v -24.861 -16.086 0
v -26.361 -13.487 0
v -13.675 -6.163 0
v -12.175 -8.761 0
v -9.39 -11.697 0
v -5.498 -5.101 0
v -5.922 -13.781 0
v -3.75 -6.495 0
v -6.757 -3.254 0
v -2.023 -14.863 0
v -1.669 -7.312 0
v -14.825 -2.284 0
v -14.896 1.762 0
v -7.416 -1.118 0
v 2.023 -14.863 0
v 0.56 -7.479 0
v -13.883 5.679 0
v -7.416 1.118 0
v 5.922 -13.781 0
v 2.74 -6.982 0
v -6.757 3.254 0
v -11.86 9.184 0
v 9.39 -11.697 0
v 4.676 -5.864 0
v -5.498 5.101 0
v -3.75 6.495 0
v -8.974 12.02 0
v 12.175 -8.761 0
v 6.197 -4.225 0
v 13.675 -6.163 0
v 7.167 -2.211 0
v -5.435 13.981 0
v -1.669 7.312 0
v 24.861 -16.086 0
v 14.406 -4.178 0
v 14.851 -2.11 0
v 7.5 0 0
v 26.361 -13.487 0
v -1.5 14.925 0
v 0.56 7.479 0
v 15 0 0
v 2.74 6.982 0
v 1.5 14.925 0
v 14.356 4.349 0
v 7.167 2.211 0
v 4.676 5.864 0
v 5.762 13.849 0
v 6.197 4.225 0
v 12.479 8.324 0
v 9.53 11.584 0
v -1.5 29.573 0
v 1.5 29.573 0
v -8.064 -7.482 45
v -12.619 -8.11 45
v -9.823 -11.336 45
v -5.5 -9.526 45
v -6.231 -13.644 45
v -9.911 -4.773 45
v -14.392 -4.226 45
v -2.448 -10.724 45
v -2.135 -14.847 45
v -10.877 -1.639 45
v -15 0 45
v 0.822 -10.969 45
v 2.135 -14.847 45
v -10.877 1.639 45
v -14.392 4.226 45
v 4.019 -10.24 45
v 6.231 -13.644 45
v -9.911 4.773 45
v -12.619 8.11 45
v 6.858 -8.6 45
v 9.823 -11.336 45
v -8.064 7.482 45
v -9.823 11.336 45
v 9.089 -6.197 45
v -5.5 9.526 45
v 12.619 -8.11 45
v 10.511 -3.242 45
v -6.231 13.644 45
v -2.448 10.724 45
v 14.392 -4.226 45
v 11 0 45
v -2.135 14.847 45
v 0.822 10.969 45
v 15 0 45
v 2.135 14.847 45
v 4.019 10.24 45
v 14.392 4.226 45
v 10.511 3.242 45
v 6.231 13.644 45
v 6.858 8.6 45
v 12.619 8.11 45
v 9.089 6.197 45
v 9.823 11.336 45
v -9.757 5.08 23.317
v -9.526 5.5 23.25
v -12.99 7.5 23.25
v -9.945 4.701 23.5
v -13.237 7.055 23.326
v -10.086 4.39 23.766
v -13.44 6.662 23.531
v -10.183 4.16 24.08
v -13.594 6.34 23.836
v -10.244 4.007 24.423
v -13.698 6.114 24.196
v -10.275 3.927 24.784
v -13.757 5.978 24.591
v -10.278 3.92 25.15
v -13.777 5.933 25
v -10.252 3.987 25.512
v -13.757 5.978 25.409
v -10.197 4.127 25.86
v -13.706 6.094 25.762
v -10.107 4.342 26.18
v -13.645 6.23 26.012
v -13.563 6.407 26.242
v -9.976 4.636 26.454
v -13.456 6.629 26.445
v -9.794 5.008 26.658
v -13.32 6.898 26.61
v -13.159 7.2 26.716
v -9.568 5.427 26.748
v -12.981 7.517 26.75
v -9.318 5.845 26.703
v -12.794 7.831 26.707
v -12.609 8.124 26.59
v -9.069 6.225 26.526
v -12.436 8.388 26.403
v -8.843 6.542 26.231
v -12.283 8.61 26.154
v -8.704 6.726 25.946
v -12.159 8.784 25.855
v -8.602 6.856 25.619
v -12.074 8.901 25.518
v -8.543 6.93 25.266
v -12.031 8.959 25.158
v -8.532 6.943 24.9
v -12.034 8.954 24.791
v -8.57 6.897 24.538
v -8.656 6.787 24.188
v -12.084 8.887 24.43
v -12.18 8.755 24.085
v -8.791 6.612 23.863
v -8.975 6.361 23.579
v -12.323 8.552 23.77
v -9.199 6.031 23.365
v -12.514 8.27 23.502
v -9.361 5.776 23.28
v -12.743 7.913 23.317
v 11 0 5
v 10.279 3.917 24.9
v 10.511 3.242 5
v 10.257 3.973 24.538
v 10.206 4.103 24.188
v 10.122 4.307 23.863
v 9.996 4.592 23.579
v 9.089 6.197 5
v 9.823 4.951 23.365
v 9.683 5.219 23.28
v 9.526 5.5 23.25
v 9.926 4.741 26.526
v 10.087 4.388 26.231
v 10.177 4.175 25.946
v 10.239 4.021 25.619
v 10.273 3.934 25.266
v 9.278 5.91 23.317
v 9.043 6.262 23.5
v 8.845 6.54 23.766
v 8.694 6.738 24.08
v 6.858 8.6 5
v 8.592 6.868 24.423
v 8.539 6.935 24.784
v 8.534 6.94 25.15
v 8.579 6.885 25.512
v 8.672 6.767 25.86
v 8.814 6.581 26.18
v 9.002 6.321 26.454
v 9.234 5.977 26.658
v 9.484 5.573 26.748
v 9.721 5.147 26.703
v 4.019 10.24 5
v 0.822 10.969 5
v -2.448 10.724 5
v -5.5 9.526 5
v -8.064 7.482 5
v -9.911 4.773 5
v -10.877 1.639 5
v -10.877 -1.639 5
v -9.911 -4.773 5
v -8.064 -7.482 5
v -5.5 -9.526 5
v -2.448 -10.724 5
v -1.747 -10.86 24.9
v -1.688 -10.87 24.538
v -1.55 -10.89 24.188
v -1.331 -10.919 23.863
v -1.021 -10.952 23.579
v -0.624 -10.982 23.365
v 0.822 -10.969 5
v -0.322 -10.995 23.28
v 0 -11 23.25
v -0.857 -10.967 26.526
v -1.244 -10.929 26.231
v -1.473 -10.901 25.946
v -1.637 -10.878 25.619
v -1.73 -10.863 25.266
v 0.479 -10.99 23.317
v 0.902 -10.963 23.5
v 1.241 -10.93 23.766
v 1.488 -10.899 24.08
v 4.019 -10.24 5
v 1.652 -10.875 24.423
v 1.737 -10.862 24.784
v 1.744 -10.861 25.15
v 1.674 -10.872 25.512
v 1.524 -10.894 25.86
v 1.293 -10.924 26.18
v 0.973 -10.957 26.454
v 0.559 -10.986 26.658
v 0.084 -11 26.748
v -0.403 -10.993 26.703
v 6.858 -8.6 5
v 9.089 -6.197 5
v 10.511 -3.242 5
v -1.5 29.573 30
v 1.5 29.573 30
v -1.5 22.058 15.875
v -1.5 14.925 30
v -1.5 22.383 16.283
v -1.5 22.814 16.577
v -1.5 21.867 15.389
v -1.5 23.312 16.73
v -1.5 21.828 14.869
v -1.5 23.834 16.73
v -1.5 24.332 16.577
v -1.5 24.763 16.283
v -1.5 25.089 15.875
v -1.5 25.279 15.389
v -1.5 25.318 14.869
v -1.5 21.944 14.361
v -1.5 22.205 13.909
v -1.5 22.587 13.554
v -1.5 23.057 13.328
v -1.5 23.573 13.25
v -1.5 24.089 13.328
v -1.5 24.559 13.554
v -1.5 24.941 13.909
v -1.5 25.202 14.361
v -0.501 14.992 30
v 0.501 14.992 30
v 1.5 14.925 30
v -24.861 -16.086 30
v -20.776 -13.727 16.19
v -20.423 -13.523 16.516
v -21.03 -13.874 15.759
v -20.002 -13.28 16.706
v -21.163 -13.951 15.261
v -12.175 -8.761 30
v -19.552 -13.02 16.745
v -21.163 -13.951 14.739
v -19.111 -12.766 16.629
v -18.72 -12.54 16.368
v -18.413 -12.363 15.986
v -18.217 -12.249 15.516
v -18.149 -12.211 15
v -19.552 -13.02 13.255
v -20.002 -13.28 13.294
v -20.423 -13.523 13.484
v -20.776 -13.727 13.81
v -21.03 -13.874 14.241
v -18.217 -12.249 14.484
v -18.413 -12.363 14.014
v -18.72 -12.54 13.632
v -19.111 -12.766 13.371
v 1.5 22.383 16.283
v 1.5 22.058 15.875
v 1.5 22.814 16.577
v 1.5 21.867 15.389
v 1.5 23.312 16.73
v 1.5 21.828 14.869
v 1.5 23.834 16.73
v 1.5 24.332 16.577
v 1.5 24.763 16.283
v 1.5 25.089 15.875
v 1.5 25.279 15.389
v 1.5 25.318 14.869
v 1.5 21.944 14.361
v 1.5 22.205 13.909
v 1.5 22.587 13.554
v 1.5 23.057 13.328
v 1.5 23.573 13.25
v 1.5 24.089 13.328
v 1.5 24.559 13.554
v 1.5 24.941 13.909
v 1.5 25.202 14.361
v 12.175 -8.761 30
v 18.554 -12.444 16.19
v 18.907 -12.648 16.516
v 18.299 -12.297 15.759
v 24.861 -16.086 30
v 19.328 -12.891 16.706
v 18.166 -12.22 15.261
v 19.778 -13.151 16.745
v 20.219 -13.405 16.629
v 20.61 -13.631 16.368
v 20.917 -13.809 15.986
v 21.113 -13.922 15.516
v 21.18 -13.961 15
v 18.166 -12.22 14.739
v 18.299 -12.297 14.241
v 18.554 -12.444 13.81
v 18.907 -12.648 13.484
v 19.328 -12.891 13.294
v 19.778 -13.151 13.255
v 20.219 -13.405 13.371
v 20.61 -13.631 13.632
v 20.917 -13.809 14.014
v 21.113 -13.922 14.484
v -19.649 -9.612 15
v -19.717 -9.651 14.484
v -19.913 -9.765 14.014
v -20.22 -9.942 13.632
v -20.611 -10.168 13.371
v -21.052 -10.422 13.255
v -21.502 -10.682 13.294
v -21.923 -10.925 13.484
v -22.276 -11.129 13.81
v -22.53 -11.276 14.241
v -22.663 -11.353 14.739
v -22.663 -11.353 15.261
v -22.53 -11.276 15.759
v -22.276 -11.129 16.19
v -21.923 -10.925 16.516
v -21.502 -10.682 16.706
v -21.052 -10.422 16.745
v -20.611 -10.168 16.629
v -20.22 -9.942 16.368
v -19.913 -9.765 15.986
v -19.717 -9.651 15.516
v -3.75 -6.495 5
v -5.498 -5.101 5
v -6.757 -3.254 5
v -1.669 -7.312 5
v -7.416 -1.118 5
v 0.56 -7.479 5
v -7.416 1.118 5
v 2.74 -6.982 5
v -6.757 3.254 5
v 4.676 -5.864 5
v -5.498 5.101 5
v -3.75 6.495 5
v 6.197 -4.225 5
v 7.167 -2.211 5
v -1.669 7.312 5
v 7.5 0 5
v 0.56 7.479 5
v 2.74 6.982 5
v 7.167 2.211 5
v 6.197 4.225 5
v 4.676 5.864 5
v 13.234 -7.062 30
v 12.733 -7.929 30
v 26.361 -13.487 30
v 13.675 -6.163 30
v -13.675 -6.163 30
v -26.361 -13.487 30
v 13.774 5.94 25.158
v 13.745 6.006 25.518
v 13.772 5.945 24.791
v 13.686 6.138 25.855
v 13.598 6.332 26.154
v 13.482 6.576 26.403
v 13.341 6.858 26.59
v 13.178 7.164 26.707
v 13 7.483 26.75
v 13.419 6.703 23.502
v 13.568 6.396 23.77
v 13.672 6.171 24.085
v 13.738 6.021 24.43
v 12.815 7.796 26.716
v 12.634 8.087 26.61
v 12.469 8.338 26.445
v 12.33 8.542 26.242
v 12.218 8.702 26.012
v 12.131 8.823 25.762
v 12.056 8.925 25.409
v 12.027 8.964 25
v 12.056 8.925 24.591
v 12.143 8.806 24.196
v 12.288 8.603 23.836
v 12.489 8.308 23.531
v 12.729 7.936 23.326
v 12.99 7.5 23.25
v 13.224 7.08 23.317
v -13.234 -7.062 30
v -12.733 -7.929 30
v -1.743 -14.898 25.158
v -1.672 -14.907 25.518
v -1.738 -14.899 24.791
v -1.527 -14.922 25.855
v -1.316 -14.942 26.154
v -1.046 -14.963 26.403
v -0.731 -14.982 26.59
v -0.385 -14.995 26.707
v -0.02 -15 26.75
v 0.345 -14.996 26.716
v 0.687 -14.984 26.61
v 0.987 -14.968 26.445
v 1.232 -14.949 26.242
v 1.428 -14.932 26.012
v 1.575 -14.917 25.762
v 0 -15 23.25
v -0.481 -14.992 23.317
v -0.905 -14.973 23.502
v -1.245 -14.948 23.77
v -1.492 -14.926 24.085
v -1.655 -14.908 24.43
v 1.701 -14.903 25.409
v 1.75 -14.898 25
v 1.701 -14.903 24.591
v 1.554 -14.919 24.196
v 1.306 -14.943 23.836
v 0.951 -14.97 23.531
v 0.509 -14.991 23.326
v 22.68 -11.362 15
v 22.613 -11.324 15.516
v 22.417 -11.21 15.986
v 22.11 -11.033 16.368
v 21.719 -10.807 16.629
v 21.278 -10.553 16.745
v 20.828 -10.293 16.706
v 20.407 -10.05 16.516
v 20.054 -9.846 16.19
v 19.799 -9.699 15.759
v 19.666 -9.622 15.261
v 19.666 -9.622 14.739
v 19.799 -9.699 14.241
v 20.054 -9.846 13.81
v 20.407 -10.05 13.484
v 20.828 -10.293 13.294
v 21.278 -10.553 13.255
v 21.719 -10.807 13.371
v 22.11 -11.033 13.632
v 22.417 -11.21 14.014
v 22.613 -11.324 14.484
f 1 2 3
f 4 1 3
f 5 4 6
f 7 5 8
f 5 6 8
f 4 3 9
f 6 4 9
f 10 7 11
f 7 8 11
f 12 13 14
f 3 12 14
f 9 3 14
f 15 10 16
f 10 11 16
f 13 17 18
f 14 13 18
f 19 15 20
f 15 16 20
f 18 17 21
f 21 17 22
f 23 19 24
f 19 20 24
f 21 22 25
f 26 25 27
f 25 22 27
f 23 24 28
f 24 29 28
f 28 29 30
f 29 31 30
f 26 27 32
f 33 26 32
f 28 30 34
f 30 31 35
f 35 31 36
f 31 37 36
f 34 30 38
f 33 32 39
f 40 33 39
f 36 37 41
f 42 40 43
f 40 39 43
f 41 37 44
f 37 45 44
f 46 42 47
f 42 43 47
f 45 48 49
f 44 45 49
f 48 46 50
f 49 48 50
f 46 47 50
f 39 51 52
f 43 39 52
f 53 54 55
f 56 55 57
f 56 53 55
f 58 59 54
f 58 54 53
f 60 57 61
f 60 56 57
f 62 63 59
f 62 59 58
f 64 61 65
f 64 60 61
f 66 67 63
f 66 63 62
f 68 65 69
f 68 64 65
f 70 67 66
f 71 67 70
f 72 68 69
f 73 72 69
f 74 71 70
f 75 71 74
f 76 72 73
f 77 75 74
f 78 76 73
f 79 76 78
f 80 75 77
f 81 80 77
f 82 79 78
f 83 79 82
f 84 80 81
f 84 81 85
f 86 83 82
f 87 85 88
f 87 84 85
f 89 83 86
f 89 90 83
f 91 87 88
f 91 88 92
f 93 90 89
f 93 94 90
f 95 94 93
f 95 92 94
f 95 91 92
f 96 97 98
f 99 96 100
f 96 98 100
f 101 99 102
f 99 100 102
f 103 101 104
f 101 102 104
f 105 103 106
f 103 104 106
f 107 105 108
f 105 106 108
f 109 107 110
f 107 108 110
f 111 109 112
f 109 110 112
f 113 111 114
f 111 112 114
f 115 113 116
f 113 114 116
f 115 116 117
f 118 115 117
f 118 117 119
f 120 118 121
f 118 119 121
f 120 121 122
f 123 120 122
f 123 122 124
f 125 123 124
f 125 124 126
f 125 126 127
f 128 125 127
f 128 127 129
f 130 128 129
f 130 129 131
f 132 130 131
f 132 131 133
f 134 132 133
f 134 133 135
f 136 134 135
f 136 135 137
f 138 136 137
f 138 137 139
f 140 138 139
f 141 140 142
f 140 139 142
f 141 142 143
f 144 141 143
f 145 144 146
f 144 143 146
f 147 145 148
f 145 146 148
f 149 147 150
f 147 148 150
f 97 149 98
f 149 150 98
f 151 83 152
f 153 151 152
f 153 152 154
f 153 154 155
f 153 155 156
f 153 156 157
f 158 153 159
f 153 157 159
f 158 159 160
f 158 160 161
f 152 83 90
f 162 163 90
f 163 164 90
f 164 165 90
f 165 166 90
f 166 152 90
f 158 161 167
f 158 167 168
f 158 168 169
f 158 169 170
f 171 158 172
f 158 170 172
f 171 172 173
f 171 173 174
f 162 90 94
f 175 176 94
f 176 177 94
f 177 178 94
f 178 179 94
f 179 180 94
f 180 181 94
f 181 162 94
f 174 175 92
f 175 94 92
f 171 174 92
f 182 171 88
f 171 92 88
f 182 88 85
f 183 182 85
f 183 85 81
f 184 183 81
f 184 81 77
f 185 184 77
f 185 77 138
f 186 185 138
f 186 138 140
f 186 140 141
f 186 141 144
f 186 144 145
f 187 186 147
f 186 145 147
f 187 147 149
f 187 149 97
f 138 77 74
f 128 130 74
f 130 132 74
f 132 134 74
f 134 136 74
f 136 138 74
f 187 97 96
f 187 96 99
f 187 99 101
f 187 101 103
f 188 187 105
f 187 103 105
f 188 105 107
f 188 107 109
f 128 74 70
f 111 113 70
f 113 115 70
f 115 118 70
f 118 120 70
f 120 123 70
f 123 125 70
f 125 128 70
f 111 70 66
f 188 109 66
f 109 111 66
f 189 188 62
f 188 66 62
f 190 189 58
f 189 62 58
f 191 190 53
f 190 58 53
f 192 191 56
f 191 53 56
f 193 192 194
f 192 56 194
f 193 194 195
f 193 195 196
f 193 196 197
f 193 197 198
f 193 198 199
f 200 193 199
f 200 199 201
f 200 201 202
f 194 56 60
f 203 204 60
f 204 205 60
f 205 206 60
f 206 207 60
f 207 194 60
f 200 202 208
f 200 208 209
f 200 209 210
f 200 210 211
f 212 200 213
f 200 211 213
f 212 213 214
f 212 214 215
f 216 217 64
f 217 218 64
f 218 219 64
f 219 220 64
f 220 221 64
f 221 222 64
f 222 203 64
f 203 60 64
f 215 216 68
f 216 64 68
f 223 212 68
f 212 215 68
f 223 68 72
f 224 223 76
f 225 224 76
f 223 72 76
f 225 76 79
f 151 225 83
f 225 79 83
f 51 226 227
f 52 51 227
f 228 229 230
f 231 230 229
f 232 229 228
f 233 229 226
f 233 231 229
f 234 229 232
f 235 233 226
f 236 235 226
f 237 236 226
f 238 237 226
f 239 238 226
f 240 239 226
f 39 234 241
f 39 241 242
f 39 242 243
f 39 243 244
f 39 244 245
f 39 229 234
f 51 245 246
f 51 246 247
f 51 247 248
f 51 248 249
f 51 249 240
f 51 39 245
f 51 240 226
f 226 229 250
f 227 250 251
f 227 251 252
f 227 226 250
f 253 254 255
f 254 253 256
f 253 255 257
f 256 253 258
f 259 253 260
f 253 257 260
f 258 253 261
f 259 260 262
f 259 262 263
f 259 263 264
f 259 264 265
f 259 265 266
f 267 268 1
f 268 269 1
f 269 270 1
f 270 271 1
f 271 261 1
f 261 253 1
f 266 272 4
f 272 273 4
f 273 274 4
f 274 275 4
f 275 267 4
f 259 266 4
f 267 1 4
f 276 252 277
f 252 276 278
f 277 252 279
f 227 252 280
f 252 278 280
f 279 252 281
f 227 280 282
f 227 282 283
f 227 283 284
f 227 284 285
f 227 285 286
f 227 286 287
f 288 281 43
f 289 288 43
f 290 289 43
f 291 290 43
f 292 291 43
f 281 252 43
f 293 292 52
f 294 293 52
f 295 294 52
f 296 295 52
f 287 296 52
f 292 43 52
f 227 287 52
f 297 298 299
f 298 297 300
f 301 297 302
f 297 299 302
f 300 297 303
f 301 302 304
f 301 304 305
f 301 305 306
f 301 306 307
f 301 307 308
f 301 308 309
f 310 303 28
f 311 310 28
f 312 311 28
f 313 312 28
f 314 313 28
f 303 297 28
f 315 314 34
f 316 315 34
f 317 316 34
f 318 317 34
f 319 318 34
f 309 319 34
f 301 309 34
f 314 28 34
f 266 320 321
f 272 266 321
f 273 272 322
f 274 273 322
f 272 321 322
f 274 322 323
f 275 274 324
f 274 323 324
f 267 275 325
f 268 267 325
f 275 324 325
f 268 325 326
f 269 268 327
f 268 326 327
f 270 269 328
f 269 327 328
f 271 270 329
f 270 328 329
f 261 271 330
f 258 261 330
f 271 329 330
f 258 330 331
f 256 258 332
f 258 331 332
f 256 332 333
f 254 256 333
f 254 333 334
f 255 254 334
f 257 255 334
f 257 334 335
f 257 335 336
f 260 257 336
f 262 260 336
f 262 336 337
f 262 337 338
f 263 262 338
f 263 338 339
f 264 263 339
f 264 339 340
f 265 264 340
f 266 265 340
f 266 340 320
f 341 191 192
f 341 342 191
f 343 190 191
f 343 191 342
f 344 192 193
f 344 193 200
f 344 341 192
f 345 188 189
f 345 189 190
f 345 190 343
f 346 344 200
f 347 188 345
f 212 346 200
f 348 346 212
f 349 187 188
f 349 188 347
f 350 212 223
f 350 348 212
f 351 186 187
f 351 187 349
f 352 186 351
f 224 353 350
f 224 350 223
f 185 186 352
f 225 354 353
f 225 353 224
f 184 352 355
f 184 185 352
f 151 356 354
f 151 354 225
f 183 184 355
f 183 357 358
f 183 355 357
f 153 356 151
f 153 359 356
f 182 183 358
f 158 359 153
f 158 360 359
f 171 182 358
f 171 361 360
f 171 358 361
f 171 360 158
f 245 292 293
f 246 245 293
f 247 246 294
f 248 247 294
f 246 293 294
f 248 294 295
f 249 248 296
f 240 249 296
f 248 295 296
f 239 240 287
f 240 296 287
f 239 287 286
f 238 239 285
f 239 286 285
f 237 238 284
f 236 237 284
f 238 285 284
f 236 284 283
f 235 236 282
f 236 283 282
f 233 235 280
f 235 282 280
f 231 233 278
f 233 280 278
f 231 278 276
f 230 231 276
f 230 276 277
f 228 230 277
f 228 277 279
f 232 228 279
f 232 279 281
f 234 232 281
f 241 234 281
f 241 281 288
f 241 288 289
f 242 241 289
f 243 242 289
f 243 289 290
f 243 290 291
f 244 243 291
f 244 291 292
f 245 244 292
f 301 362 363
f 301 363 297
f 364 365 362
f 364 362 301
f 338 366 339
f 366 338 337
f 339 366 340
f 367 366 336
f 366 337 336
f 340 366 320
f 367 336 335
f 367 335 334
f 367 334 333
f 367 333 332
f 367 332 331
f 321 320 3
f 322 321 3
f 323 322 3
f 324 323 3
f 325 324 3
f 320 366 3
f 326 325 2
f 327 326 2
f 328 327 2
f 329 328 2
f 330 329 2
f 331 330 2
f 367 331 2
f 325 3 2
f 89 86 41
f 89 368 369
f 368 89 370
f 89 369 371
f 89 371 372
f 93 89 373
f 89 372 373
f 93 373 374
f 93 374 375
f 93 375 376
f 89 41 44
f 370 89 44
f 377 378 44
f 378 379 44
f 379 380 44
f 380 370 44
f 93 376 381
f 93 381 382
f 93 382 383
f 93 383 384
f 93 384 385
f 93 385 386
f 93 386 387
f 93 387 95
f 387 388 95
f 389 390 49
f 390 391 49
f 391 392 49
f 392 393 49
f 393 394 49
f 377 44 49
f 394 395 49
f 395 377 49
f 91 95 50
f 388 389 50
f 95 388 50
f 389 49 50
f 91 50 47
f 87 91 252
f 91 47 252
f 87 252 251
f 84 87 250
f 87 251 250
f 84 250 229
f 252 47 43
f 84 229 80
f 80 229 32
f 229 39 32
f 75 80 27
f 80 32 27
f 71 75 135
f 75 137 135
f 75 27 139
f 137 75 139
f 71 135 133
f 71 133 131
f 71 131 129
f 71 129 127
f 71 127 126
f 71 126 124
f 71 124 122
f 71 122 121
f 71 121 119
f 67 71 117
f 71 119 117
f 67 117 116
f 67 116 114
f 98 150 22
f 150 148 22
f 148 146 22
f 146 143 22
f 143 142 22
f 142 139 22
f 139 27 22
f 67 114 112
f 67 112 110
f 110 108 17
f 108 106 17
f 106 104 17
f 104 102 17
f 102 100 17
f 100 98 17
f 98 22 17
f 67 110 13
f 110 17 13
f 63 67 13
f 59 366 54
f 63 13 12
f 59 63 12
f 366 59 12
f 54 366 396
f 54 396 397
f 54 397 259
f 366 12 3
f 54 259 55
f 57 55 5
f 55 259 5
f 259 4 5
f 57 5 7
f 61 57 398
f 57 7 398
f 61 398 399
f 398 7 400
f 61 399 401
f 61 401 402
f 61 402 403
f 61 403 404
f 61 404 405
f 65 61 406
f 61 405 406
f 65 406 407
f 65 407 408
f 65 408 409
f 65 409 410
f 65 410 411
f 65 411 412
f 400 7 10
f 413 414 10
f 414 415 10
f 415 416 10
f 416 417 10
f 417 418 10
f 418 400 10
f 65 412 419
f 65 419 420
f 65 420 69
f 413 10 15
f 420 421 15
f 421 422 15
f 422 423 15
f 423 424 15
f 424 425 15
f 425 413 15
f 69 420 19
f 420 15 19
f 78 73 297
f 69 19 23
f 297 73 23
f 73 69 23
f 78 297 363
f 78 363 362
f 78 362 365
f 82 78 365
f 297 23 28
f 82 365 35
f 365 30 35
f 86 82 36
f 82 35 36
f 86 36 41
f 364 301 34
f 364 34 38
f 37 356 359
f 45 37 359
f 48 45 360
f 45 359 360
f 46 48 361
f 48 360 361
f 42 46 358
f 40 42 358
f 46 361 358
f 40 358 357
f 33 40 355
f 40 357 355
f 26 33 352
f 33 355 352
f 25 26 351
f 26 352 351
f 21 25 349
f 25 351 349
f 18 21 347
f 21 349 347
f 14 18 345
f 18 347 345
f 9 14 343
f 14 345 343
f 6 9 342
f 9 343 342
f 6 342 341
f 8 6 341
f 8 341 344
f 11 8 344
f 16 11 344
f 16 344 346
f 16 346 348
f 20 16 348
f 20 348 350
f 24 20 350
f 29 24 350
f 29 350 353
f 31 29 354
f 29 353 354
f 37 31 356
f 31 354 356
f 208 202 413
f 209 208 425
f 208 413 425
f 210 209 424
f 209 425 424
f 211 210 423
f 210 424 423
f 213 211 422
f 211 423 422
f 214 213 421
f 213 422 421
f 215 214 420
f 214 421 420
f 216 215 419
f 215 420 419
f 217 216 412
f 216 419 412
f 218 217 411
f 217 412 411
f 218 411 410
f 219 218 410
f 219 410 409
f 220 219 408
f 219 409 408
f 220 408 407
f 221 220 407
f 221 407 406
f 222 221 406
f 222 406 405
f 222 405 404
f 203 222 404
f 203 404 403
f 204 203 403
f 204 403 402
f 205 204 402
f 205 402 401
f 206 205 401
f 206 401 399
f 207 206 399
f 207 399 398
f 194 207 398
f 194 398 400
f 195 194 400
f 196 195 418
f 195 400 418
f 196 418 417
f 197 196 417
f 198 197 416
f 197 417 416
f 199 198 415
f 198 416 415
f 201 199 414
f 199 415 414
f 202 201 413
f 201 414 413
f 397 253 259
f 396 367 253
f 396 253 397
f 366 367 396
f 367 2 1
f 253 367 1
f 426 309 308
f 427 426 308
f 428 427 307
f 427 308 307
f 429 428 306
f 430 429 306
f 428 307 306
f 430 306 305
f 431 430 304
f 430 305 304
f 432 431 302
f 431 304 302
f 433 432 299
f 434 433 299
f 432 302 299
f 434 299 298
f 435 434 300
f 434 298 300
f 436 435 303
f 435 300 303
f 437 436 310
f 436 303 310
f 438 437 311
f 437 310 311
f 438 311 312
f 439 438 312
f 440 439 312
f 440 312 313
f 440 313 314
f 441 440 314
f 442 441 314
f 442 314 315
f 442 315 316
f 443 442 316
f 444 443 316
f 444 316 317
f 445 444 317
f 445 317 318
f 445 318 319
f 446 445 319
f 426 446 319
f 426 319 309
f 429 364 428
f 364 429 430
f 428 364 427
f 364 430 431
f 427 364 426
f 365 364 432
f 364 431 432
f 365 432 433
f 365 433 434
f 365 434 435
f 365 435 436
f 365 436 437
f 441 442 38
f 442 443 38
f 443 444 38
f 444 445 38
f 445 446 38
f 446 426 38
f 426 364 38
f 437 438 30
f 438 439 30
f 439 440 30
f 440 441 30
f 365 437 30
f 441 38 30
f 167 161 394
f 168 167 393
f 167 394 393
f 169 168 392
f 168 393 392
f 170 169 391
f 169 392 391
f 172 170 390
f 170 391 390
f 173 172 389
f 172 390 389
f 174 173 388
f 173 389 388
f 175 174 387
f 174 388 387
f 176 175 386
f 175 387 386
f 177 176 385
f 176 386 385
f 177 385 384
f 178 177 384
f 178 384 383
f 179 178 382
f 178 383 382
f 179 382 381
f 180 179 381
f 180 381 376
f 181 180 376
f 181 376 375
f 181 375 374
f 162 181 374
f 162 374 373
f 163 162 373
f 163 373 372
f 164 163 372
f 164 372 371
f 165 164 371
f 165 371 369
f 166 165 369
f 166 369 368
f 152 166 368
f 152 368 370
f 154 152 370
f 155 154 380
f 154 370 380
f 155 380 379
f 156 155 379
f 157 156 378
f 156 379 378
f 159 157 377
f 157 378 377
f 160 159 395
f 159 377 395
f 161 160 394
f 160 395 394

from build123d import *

# Parameters (mm, degrees)
SKETCH_1_R               = 15
EXTRUDE_1_DEPTH          = 45
SKETCH_2_R               = 11
CUT_EXTRUDE_1_DEPTH      = 40
SKETCH_3_R               = 7.5
CUT_EXTRUDE_2_DEPTH      = 5
SKETCH_4_W               = 3
SKETCH_4_H               = 15
EXTRUDE_2_DEPTH          = 30
SKETCH_5_R               = 1.75
CUT_EXTRUDE_3_DEPTH      = 30
SKETCH_6_R               = 1.75
CUT_EXTRUDE_4_DEPTH      = 30
SKETCH_7_R               = 1.75
CUT_EXTRUDE_5_DEPTH      = 30
SKETCH_8_R               = 1.75
CUT_EXTRUDE_6_DEPTH      = 10
PATTERN_CIRCULAR_1_COUNT = 3


with BuildPart() as part:
    # 草圖1 → 填料-伸長1 (new body)
    with BuildSketch(Plane.XY):
        Circle(SKETCH_1_R)
    extrude(amount=EXTRUDE_1_DEPTH)

    # 草圖2 → 除料-伸長1 (cut)
    with BuildSketch(Plane.XY.offset(45)):
        Circle(SKETCH_2_R)
    extrude(amount=-CUT_EXTRUDE_1_DEPTH, mode=Mode.SUBTRACT)

    # 草圖3 → 除料-伸長2 (cut)
    with BuildSketch(Plane.XY.offset(5)):
        Circle(SKETCH_3_R)
    extrude(amount=-CUT_EXTRUDE_2_DEPTH, mode=Mode.SUBTRACT)

    # 草圖4 → 填料-伸長2 (add)
    with BuildSketch(Plane.XY):
        Polygon((26.361016738, -13.487489302), (13.370635681, -5.987489302), (11.870635681, -8.585565513), (24.861016738, -16.085565513), align=None)
        with Locations((0, 22.073054816)):
            Rectangle(SKETCH_4_W, SKETCH_4_H)
        Polygon((-24.861016738, -16.085565513), (-11.870635681, -8.585565513), (-13.370635681, -5.987489302), (-26.361016738, -13.487489302), align=None)
    extrude(amount=EXTRUDE_2_DEPTH)

    # 草圖5 → 除料-伸長3 (cut)
    with BuildSketch(Plane(origin=(-0.75, -1.299038106, 0), x_dir=(0.866025404, -0.5, 0), z_dir=(-0.5, -0.866025404, 0))):
        with Locations((23.573054816, 15)):
            Circle(SKETCH_5_R)
    extrude(amount=-CUT_EXTRUDE_3_DEPTH, mode=Mode.SUBTRACT)

    # 草圖6 → 除料-伸長4 (cut)
    with BuildSketch(Plane(origin=(1.5, 0, 0), x_dir=(0, 0, -1), z_dir=(1, 0, 0))):
        with Locations((-15, 23.573054816)):
            Circle(SKETCH_6_R)
    extrude(amount=-CUT_EXTRUDE_4_DEPTH, mode=Mode.SUBTRACT)

    # 草圖7 → 除料-伸長5 (cut)
    with BuildSketch(Plane(origin=(-0.75, 1.299038106, 0), x_dir=(0.866025404, 0.5, 0), z_dir=(-0.5, 0.866025404, 0))):
        with Locations((-23.573054816, -15)):
            Circle(SKETCH_7_R)
    extrude(amount=-CUT_EXTRUDE_5_DEPTH, mode=Mode.SUBTRACT)

    # 草圖8 → 除料-伸長6 (cut)
    with BuildSketch(Plane(origin=(0, -15, 0), x_dir=(0, 0, -1), z_dir=(0, -1, 0))):
        with Locations((-25, 0)):
            Circle(SKETCH_8_R)
    cut_extrude_6 = extrude(amount=-CUT_EXTRUDE_6_DEPTH, mode=Mode.SUBTRACT)

    # 環狀複製排列1: 除料-伸長6 ×3 about axis
    pattern_circular_1_axis = Axis((0, 0, 0), (0, 0, 1))
    for i in range(1, PATTERN_CIRCULAR_1_COUNT):
        add(cut_extrude_6.rotate(pattern_circular_1_axis, i * 360 / PATTERN_CIRCULAR_1_COUNT), mode=Mode.SUBTRACT)


solid = part.part
